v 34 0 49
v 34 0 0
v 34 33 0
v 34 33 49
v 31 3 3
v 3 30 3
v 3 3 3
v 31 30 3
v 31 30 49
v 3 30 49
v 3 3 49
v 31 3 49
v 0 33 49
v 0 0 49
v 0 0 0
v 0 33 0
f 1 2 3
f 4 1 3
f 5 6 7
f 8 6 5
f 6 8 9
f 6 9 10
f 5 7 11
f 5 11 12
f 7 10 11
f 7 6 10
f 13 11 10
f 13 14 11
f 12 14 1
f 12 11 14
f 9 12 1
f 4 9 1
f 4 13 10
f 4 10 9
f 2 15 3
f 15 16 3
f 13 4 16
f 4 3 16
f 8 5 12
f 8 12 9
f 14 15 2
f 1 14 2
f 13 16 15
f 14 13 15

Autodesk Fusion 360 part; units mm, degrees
sketch "Sketch1" plane through (0, 0, 0) normal (0, 0, 1) x (1, 0, 0)
  line L0 (0, 0) -> (34, 0)
  line L1 (34, 0) -> (34, 33)
  line L2 (34, 33) -> (0, 33)
  line L3 (0, 33) -> (0, 0)
  dimension "d1" = 33
  dimension "d2" = 34
extrude "Extrude1" add sketch "Sketch1" along normal blind 49
shell "Shell1" thickness 3 removed faces 1 at (11.3333, 22, 49)
